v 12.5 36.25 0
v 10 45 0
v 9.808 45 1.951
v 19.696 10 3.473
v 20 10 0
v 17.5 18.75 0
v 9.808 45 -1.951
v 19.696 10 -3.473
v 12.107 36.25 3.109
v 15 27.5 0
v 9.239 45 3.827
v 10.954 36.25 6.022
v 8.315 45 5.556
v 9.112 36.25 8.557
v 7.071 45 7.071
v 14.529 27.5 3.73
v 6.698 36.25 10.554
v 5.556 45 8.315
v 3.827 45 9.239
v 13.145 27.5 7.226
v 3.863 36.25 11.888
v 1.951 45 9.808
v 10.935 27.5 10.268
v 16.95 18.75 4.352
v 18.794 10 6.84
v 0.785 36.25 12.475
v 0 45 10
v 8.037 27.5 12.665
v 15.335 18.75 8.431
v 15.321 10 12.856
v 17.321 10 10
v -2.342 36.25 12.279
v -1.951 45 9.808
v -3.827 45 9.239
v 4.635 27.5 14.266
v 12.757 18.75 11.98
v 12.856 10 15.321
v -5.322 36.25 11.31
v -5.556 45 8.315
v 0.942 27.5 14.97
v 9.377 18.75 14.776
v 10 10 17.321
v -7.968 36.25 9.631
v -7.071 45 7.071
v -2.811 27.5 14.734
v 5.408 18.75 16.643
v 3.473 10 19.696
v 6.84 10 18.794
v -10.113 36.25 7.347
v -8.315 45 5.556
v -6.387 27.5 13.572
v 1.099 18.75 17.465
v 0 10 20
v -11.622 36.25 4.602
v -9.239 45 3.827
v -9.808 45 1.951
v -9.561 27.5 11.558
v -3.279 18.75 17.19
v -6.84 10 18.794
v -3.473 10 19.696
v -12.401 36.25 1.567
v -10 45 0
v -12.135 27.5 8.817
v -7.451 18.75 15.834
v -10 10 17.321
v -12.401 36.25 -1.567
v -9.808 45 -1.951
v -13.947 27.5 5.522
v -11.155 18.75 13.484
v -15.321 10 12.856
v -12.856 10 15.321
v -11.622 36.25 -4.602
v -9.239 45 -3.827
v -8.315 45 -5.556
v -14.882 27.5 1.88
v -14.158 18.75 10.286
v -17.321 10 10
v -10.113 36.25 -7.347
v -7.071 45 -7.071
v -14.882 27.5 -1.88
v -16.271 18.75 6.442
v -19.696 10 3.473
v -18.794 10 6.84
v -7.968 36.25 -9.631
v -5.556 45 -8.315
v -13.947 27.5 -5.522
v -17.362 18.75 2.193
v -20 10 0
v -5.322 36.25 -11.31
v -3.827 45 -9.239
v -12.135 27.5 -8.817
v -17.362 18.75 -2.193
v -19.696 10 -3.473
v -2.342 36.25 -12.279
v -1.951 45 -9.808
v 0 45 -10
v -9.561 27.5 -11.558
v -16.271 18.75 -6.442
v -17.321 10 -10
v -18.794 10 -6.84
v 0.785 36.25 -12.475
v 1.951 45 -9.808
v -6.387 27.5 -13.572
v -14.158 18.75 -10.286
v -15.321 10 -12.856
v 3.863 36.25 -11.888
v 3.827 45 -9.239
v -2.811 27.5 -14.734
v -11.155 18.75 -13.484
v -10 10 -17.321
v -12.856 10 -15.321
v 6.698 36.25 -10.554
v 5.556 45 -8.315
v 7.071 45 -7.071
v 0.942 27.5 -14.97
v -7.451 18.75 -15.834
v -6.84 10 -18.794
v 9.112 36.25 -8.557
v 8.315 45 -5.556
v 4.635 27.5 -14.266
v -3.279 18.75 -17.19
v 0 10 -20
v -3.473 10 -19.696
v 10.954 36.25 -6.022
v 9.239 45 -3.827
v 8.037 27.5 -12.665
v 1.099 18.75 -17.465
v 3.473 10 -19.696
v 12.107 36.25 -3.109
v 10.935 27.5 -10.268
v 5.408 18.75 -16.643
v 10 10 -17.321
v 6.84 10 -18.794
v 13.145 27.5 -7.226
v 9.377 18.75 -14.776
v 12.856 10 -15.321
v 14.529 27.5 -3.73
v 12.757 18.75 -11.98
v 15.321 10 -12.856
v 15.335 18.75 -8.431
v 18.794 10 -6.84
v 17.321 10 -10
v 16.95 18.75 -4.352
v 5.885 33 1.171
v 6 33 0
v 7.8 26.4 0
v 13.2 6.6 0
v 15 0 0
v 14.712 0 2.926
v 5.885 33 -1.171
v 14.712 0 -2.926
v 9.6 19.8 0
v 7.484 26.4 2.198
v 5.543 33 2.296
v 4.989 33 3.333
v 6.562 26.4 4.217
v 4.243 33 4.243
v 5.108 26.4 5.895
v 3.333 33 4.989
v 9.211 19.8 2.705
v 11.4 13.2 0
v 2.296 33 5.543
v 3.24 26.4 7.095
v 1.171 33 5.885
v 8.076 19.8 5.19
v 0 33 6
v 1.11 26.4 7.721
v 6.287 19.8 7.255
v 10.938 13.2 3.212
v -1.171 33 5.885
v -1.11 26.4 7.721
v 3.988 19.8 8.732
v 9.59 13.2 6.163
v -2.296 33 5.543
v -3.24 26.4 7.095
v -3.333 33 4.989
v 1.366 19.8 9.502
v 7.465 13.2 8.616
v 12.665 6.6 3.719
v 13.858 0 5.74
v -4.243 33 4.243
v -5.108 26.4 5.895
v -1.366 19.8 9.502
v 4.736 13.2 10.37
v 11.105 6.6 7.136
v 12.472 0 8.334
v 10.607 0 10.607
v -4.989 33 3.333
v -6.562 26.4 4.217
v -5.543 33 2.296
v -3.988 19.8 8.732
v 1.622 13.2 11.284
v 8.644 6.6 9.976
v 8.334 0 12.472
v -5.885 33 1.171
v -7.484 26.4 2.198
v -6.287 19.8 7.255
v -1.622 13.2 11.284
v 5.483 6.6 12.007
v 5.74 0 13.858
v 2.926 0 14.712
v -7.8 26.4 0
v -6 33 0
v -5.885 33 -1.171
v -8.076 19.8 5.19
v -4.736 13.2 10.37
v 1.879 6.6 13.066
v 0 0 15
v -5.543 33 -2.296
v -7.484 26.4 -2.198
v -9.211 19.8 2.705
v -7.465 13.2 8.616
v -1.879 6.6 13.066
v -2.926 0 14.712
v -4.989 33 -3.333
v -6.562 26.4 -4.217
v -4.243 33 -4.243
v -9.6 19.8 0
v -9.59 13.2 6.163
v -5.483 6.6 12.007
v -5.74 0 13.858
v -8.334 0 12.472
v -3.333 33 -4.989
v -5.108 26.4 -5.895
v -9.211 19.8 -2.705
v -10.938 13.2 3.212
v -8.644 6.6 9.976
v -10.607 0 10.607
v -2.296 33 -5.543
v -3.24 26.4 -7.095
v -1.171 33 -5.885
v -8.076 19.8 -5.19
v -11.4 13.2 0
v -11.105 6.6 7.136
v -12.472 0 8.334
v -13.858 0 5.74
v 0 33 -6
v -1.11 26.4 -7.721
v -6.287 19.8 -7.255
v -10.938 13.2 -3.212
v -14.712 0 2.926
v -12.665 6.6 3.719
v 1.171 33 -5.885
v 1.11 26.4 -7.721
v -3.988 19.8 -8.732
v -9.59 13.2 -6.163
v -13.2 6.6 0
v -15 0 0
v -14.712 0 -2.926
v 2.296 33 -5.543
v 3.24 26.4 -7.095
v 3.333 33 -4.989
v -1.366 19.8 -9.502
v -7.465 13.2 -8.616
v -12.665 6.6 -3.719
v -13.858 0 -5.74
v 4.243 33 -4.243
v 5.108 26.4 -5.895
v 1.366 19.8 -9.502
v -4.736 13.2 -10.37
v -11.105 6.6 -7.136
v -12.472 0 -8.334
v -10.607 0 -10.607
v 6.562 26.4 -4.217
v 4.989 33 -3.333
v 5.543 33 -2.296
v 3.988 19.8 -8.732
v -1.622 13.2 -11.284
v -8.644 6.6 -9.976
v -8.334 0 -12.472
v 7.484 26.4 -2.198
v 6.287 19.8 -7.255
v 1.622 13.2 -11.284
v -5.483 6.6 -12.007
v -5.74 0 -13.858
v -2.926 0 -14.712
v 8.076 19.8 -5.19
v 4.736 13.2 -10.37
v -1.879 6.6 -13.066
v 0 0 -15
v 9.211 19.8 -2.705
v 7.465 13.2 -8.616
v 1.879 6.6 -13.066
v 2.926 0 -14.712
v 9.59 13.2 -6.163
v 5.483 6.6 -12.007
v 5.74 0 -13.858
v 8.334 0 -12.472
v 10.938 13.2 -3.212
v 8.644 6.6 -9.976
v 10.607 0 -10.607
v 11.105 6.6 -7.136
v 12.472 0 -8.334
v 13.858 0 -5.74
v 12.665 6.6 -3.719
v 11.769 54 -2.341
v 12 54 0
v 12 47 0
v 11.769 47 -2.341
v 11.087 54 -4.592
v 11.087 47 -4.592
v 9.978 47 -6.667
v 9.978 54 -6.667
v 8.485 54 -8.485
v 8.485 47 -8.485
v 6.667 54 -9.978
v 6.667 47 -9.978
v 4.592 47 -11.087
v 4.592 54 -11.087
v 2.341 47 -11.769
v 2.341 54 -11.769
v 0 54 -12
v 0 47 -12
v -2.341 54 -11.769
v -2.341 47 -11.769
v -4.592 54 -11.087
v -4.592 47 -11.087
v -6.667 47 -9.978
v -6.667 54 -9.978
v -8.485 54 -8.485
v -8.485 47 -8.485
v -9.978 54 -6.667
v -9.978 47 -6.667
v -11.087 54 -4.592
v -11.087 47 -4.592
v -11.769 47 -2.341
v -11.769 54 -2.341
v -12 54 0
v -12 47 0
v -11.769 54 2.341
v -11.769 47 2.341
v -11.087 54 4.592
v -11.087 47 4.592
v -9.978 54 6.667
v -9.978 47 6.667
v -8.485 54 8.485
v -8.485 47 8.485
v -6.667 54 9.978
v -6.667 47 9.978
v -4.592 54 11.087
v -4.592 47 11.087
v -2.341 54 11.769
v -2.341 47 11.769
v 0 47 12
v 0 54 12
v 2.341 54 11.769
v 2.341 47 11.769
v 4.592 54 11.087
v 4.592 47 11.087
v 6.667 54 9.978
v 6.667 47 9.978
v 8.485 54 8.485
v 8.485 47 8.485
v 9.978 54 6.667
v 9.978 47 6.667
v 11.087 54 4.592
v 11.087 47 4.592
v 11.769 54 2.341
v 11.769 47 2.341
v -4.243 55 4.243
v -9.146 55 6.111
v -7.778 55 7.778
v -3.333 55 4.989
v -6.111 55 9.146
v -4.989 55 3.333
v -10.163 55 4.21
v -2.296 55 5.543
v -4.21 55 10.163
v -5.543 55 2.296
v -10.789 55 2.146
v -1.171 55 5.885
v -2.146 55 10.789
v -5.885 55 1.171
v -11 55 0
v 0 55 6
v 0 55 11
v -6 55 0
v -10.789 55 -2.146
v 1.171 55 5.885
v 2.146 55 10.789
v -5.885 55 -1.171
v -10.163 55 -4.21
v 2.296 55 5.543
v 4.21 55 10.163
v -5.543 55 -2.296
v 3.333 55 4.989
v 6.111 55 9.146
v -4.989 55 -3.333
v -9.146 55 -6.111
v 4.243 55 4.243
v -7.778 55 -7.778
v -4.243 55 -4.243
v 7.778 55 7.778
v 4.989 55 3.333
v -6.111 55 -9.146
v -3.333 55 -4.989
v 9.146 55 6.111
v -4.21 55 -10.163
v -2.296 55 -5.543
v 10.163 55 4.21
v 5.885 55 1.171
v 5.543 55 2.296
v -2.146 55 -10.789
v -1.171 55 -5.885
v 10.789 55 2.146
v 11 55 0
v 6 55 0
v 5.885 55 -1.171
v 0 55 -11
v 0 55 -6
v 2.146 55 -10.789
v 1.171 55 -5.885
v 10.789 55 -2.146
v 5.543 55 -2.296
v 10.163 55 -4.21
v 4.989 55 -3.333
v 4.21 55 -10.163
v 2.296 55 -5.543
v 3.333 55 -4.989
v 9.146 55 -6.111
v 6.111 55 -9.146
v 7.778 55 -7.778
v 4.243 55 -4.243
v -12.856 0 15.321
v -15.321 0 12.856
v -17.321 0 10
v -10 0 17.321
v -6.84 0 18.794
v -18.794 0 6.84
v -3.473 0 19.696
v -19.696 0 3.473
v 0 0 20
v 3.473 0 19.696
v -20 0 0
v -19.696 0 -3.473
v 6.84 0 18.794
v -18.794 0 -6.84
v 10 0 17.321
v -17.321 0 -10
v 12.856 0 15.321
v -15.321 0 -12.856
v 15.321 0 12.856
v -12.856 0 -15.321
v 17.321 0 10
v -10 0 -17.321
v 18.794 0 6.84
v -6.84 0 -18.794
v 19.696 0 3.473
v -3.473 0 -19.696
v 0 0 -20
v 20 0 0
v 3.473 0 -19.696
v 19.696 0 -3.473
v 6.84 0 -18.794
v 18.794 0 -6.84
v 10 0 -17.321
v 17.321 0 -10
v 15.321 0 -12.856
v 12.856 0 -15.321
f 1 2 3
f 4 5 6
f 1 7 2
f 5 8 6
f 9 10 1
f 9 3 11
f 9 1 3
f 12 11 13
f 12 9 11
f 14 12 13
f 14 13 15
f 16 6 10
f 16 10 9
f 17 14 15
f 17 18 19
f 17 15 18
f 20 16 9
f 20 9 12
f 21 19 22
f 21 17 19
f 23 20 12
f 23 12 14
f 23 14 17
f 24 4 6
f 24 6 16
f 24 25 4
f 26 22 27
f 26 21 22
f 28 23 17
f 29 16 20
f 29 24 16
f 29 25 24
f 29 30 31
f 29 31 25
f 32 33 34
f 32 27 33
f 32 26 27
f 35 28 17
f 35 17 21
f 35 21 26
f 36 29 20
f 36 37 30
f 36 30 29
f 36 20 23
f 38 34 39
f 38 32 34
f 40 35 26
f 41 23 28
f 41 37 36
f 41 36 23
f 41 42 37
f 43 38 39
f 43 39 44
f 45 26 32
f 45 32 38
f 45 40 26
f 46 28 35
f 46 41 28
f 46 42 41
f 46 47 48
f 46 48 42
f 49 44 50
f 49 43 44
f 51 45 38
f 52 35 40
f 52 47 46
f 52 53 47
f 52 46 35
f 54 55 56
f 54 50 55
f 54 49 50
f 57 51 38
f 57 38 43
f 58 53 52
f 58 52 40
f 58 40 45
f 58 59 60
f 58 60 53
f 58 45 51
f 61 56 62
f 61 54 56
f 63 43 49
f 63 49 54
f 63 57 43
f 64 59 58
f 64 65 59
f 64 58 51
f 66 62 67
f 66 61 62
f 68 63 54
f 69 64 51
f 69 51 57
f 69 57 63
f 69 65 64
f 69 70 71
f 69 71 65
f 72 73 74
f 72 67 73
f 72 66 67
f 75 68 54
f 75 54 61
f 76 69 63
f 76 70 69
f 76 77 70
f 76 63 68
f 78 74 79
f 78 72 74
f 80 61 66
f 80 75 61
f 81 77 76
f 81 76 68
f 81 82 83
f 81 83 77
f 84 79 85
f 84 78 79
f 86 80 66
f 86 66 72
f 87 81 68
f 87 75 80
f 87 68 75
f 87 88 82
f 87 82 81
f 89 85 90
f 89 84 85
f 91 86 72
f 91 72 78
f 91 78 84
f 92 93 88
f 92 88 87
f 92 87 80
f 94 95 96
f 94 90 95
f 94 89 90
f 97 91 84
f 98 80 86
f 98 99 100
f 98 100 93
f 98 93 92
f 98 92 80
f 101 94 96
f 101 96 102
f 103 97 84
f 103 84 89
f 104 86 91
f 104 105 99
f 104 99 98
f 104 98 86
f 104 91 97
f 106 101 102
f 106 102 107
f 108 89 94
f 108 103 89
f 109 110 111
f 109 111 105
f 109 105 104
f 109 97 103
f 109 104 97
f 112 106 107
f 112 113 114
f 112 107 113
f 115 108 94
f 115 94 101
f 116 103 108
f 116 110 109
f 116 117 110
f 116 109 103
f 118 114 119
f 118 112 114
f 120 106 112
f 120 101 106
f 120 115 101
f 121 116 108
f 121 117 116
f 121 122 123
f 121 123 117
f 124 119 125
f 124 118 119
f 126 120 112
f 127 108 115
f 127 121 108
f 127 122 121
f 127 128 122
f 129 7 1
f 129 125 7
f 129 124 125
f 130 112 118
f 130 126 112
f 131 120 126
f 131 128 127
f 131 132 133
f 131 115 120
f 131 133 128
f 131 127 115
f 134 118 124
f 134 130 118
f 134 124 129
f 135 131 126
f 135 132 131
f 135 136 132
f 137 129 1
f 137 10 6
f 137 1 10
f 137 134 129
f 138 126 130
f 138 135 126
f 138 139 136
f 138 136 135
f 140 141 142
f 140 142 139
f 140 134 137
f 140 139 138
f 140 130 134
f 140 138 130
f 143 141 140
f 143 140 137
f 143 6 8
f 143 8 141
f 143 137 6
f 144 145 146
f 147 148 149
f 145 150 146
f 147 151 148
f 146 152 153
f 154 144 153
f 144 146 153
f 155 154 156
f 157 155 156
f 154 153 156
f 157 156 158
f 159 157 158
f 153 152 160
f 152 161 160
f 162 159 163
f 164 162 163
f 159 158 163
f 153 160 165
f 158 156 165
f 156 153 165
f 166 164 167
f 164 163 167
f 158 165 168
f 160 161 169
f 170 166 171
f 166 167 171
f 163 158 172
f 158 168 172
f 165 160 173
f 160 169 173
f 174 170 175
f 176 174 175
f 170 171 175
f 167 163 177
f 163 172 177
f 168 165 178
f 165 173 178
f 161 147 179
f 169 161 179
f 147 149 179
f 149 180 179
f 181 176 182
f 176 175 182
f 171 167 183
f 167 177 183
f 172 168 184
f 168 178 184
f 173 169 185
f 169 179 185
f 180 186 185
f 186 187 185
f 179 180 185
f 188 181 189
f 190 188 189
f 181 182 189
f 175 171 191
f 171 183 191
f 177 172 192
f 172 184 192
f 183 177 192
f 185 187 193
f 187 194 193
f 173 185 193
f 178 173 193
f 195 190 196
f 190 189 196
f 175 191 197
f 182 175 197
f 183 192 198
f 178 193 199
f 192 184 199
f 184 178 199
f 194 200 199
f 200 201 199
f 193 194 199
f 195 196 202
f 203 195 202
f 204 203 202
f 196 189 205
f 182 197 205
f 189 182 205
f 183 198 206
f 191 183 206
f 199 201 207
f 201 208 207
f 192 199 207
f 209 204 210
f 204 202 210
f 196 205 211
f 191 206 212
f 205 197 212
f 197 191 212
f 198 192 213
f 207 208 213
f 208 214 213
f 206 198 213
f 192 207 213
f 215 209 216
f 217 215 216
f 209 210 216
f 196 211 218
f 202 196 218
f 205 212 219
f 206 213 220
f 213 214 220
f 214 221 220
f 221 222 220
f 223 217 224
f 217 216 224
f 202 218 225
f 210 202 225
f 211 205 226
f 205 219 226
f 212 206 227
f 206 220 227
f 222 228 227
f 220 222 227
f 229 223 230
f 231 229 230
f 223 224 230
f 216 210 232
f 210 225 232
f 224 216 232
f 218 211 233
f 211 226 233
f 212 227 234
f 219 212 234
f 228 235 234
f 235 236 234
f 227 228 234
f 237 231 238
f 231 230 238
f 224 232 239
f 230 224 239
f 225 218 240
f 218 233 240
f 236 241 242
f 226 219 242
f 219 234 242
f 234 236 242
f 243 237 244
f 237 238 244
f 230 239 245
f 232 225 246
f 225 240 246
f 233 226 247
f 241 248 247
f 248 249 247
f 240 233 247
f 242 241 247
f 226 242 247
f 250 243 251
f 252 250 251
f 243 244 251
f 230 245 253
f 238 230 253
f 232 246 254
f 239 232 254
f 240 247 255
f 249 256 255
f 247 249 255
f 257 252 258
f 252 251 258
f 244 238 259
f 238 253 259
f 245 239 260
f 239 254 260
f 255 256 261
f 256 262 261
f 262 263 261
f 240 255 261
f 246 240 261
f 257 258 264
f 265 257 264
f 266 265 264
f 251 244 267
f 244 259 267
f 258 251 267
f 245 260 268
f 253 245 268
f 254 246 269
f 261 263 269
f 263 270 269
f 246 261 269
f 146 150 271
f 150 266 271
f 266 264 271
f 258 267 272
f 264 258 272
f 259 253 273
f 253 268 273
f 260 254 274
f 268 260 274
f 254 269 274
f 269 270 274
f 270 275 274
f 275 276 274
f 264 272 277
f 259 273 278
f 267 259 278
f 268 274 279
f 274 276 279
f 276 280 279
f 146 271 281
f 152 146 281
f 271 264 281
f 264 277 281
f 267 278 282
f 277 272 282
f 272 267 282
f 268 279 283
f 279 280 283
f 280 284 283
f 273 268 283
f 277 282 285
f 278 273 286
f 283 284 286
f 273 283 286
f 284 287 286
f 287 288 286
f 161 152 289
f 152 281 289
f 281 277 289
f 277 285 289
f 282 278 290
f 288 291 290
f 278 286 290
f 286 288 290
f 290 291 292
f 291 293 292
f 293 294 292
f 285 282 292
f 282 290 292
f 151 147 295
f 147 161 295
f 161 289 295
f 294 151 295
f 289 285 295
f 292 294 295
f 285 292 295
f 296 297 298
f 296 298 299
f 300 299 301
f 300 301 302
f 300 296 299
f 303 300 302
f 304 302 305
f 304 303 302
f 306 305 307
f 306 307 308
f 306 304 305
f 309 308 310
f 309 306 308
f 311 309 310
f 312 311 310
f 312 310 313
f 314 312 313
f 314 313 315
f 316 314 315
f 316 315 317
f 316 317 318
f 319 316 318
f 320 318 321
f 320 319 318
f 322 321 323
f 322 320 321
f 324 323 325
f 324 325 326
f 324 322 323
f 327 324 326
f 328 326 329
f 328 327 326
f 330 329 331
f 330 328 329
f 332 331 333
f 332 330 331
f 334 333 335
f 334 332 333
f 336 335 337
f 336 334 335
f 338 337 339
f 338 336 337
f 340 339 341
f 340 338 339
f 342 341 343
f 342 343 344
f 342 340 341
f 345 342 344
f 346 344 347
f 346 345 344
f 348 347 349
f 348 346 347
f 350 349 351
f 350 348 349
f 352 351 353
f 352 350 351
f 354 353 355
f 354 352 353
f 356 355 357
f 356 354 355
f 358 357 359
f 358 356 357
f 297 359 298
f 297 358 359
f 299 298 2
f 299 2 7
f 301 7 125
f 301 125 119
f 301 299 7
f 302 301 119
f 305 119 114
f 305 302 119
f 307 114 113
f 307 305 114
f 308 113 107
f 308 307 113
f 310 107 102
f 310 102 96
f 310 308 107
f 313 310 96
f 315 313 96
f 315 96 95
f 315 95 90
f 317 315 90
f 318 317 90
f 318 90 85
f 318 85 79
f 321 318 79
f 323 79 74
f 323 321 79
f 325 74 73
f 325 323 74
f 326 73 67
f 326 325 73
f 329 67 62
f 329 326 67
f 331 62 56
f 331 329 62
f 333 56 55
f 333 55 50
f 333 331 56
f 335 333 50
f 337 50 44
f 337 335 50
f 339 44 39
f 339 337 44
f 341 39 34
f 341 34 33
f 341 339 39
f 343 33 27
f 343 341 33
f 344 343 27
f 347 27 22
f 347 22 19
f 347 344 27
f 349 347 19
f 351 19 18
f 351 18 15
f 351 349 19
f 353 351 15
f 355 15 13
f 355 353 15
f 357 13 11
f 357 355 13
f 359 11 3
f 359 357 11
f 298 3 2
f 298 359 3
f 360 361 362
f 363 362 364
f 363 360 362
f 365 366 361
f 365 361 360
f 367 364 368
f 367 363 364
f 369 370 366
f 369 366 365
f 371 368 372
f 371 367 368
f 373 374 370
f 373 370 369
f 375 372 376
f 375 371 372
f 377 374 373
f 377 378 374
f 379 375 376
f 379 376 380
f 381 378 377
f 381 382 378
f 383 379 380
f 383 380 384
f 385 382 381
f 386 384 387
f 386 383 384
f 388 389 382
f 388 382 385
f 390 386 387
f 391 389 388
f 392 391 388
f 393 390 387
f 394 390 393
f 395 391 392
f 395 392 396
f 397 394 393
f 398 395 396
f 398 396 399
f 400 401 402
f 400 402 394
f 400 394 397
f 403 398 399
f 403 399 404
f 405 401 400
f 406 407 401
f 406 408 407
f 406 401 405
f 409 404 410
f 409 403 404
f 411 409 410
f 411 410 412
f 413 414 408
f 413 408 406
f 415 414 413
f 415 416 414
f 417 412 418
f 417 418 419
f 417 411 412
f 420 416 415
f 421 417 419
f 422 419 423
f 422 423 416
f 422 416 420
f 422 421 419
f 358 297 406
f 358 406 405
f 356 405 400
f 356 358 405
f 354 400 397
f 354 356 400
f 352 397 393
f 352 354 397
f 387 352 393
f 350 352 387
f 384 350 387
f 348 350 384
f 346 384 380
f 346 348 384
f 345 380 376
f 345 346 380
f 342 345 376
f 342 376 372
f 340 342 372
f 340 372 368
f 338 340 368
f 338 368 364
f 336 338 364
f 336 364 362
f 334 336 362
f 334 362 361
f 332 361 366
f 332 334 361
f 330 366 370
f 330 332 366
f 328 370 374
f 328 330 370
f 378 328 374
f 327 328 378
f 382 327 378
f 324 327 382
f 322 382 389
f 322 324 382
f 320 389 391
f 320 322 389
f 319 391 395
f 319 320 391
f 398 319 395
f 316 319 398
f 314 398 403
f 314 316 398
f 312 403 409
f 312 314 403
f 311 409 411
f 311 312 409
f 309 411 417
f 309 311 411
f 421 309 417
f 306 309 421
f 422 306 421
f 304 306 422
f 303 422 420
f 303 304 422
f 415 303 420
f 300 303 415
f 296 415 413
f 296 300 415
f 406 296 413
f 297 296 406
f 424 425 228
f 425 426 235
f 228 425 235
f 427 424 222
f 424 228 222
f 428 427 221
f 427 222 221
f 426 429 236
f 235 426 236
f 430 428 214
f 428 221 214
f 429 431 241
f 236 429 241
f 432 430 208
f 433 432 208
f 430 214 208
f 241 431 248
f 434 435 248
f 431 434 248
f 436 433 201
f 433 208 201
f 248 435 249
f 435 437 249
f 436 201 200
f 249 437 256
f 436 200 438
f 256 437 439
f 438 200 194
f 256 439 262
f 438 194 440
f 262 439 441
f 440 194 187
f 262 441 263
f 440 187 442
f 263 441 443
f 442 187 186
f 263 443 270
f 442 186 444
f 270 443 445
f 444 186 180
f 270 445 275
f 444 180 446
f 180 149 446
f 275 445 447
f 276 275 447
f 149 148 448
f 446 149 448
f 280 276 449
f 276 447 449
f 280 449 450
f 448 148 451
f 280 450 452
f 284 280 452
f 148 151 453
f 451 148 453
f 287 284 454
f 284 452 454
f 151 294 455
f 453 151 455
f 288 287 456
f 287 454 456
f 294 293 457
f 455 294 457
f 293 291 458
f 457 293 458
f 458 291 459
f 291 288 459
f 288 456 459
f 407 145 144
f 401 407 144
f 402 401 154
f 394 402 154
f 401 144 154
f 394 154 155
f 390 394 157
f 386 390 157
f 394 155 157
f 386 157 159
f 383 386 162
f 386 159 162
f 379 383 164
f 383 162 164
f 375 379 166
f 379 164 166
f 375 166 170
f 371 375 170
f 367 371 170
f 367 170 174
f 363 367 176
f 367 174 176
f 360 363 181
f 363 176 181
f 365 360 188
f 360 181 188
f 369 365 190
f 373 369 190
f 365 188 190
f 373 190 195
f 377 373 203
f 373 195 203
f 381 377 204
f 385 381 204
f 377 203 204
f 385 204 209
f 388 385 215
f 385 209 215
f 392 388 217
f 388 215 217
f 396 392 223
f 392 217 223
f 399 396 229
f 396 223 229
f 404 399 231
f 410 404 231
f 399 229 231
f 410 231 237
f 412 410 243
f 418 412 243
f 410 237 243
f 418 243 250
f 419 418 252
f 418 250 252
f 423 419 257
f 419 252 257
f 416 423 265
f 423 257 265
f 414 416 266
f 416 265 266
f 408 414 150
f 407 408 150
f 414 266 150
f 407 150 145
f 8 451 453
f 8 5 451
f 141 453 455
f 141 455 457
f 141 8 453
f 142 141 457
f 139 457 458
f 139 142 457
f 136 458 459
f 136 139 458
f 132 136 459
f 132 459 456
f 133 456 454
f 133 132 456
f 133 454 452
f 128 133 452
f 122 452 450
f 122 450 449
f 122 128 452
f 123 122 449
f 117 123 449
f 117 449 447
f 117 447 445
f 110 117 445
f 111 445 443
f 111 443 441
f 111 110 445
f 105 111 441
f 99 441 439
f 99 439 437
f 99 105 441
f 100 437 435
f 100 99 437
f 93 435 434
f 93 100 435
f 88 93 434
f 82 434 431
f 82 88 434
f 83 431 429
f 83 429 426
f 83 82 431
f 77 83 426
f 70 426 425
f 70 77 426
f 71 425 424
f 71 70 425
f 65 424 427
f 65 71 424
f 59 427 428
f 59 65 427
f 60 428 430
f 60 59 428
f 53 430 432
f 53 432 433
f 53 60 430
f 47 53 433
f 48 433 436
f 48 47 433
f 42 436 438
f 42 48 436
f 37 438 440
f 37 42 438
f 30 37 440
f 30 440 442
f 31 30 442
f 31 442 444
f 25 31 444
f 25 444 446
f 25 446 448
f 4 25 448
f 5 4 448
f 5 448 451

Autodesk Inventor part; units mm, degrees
ref_plane "YZ Plane" through (0, 0, 0) normal (1, 0, 0) x (0, 1, 0)
ref_plane "XZ Plane" through (0, 0, 0) normal (0, 1, 0) x (-1, 0, 0)
ref_plane "XY Plane" through (0, 0, 0) normal (0, 0, 1) x (1, 0, 0)
sketch "草圖1" plane through (0, 0, 0) normal (0, 0, 1) x (1, 0, 0)
  line L0 (0, 0) -> (20, 0)
  line L1 (20, 0) -> (20, 10)
  line L2 (20, 10) -> (10, 45)
  line L3 (12, 47) -> (10, 45)
  line L4 (12, 47) -> (12, 54)
  line L5 (11, 55) -> (0, 55)
  line L6 (12, 54) -> (11, 55)
  line L7 (0, 0) -> (0, 55)
  point P0 (12, 55)
  dimension "d0" = 20
  dimension "d1" = 10
  dimension "d4" = 8
  dimension "d5" = 1
  dimension "d6" = 45
  dimension "d7" = 2
  dimension "d8" = 2
  dimension "d9" = 55
  dimension "d10" = 10
revolve "迴轉1" add sketch "草圖1" angle 360 about axis through (0, 0, 0) along (0, 1, 0)
sketch "草圖2" plane through (0, 0, 0) normal (0, 0, 1) x (1, 0, 0)
  line L0 (0, 0) -> (15, 0)
  line L1 (-20, 0) -> (20, 0) projected
  line L2 (15, 0) -> (6, 33)
  line L3 (6, 33) -> (0, 33)
  line L4 (0, 33) -> (0, 0)
  dimension "d12" = 15
  dimension "d13" = 6
  dimension "d14" = 33
revolve "迴轉2" cut sketch "草圖2" angle 360 about axis through (0, 33, 0) along (0, -1, 0)
sketch "草圖3" plane through (0, 33, 0) normal (0, -1, 0) x (1, 0, 0)
  circle A0 centre (0, 0) radius 6
  dimension "d16" = 12
extrude "擠出1" cut sketch "草圖3" against normal through all
thread "螺紋1" size "M12x1.75" class "6H" standard "ANSI Metric M Profile" full length
properties part number "C"
